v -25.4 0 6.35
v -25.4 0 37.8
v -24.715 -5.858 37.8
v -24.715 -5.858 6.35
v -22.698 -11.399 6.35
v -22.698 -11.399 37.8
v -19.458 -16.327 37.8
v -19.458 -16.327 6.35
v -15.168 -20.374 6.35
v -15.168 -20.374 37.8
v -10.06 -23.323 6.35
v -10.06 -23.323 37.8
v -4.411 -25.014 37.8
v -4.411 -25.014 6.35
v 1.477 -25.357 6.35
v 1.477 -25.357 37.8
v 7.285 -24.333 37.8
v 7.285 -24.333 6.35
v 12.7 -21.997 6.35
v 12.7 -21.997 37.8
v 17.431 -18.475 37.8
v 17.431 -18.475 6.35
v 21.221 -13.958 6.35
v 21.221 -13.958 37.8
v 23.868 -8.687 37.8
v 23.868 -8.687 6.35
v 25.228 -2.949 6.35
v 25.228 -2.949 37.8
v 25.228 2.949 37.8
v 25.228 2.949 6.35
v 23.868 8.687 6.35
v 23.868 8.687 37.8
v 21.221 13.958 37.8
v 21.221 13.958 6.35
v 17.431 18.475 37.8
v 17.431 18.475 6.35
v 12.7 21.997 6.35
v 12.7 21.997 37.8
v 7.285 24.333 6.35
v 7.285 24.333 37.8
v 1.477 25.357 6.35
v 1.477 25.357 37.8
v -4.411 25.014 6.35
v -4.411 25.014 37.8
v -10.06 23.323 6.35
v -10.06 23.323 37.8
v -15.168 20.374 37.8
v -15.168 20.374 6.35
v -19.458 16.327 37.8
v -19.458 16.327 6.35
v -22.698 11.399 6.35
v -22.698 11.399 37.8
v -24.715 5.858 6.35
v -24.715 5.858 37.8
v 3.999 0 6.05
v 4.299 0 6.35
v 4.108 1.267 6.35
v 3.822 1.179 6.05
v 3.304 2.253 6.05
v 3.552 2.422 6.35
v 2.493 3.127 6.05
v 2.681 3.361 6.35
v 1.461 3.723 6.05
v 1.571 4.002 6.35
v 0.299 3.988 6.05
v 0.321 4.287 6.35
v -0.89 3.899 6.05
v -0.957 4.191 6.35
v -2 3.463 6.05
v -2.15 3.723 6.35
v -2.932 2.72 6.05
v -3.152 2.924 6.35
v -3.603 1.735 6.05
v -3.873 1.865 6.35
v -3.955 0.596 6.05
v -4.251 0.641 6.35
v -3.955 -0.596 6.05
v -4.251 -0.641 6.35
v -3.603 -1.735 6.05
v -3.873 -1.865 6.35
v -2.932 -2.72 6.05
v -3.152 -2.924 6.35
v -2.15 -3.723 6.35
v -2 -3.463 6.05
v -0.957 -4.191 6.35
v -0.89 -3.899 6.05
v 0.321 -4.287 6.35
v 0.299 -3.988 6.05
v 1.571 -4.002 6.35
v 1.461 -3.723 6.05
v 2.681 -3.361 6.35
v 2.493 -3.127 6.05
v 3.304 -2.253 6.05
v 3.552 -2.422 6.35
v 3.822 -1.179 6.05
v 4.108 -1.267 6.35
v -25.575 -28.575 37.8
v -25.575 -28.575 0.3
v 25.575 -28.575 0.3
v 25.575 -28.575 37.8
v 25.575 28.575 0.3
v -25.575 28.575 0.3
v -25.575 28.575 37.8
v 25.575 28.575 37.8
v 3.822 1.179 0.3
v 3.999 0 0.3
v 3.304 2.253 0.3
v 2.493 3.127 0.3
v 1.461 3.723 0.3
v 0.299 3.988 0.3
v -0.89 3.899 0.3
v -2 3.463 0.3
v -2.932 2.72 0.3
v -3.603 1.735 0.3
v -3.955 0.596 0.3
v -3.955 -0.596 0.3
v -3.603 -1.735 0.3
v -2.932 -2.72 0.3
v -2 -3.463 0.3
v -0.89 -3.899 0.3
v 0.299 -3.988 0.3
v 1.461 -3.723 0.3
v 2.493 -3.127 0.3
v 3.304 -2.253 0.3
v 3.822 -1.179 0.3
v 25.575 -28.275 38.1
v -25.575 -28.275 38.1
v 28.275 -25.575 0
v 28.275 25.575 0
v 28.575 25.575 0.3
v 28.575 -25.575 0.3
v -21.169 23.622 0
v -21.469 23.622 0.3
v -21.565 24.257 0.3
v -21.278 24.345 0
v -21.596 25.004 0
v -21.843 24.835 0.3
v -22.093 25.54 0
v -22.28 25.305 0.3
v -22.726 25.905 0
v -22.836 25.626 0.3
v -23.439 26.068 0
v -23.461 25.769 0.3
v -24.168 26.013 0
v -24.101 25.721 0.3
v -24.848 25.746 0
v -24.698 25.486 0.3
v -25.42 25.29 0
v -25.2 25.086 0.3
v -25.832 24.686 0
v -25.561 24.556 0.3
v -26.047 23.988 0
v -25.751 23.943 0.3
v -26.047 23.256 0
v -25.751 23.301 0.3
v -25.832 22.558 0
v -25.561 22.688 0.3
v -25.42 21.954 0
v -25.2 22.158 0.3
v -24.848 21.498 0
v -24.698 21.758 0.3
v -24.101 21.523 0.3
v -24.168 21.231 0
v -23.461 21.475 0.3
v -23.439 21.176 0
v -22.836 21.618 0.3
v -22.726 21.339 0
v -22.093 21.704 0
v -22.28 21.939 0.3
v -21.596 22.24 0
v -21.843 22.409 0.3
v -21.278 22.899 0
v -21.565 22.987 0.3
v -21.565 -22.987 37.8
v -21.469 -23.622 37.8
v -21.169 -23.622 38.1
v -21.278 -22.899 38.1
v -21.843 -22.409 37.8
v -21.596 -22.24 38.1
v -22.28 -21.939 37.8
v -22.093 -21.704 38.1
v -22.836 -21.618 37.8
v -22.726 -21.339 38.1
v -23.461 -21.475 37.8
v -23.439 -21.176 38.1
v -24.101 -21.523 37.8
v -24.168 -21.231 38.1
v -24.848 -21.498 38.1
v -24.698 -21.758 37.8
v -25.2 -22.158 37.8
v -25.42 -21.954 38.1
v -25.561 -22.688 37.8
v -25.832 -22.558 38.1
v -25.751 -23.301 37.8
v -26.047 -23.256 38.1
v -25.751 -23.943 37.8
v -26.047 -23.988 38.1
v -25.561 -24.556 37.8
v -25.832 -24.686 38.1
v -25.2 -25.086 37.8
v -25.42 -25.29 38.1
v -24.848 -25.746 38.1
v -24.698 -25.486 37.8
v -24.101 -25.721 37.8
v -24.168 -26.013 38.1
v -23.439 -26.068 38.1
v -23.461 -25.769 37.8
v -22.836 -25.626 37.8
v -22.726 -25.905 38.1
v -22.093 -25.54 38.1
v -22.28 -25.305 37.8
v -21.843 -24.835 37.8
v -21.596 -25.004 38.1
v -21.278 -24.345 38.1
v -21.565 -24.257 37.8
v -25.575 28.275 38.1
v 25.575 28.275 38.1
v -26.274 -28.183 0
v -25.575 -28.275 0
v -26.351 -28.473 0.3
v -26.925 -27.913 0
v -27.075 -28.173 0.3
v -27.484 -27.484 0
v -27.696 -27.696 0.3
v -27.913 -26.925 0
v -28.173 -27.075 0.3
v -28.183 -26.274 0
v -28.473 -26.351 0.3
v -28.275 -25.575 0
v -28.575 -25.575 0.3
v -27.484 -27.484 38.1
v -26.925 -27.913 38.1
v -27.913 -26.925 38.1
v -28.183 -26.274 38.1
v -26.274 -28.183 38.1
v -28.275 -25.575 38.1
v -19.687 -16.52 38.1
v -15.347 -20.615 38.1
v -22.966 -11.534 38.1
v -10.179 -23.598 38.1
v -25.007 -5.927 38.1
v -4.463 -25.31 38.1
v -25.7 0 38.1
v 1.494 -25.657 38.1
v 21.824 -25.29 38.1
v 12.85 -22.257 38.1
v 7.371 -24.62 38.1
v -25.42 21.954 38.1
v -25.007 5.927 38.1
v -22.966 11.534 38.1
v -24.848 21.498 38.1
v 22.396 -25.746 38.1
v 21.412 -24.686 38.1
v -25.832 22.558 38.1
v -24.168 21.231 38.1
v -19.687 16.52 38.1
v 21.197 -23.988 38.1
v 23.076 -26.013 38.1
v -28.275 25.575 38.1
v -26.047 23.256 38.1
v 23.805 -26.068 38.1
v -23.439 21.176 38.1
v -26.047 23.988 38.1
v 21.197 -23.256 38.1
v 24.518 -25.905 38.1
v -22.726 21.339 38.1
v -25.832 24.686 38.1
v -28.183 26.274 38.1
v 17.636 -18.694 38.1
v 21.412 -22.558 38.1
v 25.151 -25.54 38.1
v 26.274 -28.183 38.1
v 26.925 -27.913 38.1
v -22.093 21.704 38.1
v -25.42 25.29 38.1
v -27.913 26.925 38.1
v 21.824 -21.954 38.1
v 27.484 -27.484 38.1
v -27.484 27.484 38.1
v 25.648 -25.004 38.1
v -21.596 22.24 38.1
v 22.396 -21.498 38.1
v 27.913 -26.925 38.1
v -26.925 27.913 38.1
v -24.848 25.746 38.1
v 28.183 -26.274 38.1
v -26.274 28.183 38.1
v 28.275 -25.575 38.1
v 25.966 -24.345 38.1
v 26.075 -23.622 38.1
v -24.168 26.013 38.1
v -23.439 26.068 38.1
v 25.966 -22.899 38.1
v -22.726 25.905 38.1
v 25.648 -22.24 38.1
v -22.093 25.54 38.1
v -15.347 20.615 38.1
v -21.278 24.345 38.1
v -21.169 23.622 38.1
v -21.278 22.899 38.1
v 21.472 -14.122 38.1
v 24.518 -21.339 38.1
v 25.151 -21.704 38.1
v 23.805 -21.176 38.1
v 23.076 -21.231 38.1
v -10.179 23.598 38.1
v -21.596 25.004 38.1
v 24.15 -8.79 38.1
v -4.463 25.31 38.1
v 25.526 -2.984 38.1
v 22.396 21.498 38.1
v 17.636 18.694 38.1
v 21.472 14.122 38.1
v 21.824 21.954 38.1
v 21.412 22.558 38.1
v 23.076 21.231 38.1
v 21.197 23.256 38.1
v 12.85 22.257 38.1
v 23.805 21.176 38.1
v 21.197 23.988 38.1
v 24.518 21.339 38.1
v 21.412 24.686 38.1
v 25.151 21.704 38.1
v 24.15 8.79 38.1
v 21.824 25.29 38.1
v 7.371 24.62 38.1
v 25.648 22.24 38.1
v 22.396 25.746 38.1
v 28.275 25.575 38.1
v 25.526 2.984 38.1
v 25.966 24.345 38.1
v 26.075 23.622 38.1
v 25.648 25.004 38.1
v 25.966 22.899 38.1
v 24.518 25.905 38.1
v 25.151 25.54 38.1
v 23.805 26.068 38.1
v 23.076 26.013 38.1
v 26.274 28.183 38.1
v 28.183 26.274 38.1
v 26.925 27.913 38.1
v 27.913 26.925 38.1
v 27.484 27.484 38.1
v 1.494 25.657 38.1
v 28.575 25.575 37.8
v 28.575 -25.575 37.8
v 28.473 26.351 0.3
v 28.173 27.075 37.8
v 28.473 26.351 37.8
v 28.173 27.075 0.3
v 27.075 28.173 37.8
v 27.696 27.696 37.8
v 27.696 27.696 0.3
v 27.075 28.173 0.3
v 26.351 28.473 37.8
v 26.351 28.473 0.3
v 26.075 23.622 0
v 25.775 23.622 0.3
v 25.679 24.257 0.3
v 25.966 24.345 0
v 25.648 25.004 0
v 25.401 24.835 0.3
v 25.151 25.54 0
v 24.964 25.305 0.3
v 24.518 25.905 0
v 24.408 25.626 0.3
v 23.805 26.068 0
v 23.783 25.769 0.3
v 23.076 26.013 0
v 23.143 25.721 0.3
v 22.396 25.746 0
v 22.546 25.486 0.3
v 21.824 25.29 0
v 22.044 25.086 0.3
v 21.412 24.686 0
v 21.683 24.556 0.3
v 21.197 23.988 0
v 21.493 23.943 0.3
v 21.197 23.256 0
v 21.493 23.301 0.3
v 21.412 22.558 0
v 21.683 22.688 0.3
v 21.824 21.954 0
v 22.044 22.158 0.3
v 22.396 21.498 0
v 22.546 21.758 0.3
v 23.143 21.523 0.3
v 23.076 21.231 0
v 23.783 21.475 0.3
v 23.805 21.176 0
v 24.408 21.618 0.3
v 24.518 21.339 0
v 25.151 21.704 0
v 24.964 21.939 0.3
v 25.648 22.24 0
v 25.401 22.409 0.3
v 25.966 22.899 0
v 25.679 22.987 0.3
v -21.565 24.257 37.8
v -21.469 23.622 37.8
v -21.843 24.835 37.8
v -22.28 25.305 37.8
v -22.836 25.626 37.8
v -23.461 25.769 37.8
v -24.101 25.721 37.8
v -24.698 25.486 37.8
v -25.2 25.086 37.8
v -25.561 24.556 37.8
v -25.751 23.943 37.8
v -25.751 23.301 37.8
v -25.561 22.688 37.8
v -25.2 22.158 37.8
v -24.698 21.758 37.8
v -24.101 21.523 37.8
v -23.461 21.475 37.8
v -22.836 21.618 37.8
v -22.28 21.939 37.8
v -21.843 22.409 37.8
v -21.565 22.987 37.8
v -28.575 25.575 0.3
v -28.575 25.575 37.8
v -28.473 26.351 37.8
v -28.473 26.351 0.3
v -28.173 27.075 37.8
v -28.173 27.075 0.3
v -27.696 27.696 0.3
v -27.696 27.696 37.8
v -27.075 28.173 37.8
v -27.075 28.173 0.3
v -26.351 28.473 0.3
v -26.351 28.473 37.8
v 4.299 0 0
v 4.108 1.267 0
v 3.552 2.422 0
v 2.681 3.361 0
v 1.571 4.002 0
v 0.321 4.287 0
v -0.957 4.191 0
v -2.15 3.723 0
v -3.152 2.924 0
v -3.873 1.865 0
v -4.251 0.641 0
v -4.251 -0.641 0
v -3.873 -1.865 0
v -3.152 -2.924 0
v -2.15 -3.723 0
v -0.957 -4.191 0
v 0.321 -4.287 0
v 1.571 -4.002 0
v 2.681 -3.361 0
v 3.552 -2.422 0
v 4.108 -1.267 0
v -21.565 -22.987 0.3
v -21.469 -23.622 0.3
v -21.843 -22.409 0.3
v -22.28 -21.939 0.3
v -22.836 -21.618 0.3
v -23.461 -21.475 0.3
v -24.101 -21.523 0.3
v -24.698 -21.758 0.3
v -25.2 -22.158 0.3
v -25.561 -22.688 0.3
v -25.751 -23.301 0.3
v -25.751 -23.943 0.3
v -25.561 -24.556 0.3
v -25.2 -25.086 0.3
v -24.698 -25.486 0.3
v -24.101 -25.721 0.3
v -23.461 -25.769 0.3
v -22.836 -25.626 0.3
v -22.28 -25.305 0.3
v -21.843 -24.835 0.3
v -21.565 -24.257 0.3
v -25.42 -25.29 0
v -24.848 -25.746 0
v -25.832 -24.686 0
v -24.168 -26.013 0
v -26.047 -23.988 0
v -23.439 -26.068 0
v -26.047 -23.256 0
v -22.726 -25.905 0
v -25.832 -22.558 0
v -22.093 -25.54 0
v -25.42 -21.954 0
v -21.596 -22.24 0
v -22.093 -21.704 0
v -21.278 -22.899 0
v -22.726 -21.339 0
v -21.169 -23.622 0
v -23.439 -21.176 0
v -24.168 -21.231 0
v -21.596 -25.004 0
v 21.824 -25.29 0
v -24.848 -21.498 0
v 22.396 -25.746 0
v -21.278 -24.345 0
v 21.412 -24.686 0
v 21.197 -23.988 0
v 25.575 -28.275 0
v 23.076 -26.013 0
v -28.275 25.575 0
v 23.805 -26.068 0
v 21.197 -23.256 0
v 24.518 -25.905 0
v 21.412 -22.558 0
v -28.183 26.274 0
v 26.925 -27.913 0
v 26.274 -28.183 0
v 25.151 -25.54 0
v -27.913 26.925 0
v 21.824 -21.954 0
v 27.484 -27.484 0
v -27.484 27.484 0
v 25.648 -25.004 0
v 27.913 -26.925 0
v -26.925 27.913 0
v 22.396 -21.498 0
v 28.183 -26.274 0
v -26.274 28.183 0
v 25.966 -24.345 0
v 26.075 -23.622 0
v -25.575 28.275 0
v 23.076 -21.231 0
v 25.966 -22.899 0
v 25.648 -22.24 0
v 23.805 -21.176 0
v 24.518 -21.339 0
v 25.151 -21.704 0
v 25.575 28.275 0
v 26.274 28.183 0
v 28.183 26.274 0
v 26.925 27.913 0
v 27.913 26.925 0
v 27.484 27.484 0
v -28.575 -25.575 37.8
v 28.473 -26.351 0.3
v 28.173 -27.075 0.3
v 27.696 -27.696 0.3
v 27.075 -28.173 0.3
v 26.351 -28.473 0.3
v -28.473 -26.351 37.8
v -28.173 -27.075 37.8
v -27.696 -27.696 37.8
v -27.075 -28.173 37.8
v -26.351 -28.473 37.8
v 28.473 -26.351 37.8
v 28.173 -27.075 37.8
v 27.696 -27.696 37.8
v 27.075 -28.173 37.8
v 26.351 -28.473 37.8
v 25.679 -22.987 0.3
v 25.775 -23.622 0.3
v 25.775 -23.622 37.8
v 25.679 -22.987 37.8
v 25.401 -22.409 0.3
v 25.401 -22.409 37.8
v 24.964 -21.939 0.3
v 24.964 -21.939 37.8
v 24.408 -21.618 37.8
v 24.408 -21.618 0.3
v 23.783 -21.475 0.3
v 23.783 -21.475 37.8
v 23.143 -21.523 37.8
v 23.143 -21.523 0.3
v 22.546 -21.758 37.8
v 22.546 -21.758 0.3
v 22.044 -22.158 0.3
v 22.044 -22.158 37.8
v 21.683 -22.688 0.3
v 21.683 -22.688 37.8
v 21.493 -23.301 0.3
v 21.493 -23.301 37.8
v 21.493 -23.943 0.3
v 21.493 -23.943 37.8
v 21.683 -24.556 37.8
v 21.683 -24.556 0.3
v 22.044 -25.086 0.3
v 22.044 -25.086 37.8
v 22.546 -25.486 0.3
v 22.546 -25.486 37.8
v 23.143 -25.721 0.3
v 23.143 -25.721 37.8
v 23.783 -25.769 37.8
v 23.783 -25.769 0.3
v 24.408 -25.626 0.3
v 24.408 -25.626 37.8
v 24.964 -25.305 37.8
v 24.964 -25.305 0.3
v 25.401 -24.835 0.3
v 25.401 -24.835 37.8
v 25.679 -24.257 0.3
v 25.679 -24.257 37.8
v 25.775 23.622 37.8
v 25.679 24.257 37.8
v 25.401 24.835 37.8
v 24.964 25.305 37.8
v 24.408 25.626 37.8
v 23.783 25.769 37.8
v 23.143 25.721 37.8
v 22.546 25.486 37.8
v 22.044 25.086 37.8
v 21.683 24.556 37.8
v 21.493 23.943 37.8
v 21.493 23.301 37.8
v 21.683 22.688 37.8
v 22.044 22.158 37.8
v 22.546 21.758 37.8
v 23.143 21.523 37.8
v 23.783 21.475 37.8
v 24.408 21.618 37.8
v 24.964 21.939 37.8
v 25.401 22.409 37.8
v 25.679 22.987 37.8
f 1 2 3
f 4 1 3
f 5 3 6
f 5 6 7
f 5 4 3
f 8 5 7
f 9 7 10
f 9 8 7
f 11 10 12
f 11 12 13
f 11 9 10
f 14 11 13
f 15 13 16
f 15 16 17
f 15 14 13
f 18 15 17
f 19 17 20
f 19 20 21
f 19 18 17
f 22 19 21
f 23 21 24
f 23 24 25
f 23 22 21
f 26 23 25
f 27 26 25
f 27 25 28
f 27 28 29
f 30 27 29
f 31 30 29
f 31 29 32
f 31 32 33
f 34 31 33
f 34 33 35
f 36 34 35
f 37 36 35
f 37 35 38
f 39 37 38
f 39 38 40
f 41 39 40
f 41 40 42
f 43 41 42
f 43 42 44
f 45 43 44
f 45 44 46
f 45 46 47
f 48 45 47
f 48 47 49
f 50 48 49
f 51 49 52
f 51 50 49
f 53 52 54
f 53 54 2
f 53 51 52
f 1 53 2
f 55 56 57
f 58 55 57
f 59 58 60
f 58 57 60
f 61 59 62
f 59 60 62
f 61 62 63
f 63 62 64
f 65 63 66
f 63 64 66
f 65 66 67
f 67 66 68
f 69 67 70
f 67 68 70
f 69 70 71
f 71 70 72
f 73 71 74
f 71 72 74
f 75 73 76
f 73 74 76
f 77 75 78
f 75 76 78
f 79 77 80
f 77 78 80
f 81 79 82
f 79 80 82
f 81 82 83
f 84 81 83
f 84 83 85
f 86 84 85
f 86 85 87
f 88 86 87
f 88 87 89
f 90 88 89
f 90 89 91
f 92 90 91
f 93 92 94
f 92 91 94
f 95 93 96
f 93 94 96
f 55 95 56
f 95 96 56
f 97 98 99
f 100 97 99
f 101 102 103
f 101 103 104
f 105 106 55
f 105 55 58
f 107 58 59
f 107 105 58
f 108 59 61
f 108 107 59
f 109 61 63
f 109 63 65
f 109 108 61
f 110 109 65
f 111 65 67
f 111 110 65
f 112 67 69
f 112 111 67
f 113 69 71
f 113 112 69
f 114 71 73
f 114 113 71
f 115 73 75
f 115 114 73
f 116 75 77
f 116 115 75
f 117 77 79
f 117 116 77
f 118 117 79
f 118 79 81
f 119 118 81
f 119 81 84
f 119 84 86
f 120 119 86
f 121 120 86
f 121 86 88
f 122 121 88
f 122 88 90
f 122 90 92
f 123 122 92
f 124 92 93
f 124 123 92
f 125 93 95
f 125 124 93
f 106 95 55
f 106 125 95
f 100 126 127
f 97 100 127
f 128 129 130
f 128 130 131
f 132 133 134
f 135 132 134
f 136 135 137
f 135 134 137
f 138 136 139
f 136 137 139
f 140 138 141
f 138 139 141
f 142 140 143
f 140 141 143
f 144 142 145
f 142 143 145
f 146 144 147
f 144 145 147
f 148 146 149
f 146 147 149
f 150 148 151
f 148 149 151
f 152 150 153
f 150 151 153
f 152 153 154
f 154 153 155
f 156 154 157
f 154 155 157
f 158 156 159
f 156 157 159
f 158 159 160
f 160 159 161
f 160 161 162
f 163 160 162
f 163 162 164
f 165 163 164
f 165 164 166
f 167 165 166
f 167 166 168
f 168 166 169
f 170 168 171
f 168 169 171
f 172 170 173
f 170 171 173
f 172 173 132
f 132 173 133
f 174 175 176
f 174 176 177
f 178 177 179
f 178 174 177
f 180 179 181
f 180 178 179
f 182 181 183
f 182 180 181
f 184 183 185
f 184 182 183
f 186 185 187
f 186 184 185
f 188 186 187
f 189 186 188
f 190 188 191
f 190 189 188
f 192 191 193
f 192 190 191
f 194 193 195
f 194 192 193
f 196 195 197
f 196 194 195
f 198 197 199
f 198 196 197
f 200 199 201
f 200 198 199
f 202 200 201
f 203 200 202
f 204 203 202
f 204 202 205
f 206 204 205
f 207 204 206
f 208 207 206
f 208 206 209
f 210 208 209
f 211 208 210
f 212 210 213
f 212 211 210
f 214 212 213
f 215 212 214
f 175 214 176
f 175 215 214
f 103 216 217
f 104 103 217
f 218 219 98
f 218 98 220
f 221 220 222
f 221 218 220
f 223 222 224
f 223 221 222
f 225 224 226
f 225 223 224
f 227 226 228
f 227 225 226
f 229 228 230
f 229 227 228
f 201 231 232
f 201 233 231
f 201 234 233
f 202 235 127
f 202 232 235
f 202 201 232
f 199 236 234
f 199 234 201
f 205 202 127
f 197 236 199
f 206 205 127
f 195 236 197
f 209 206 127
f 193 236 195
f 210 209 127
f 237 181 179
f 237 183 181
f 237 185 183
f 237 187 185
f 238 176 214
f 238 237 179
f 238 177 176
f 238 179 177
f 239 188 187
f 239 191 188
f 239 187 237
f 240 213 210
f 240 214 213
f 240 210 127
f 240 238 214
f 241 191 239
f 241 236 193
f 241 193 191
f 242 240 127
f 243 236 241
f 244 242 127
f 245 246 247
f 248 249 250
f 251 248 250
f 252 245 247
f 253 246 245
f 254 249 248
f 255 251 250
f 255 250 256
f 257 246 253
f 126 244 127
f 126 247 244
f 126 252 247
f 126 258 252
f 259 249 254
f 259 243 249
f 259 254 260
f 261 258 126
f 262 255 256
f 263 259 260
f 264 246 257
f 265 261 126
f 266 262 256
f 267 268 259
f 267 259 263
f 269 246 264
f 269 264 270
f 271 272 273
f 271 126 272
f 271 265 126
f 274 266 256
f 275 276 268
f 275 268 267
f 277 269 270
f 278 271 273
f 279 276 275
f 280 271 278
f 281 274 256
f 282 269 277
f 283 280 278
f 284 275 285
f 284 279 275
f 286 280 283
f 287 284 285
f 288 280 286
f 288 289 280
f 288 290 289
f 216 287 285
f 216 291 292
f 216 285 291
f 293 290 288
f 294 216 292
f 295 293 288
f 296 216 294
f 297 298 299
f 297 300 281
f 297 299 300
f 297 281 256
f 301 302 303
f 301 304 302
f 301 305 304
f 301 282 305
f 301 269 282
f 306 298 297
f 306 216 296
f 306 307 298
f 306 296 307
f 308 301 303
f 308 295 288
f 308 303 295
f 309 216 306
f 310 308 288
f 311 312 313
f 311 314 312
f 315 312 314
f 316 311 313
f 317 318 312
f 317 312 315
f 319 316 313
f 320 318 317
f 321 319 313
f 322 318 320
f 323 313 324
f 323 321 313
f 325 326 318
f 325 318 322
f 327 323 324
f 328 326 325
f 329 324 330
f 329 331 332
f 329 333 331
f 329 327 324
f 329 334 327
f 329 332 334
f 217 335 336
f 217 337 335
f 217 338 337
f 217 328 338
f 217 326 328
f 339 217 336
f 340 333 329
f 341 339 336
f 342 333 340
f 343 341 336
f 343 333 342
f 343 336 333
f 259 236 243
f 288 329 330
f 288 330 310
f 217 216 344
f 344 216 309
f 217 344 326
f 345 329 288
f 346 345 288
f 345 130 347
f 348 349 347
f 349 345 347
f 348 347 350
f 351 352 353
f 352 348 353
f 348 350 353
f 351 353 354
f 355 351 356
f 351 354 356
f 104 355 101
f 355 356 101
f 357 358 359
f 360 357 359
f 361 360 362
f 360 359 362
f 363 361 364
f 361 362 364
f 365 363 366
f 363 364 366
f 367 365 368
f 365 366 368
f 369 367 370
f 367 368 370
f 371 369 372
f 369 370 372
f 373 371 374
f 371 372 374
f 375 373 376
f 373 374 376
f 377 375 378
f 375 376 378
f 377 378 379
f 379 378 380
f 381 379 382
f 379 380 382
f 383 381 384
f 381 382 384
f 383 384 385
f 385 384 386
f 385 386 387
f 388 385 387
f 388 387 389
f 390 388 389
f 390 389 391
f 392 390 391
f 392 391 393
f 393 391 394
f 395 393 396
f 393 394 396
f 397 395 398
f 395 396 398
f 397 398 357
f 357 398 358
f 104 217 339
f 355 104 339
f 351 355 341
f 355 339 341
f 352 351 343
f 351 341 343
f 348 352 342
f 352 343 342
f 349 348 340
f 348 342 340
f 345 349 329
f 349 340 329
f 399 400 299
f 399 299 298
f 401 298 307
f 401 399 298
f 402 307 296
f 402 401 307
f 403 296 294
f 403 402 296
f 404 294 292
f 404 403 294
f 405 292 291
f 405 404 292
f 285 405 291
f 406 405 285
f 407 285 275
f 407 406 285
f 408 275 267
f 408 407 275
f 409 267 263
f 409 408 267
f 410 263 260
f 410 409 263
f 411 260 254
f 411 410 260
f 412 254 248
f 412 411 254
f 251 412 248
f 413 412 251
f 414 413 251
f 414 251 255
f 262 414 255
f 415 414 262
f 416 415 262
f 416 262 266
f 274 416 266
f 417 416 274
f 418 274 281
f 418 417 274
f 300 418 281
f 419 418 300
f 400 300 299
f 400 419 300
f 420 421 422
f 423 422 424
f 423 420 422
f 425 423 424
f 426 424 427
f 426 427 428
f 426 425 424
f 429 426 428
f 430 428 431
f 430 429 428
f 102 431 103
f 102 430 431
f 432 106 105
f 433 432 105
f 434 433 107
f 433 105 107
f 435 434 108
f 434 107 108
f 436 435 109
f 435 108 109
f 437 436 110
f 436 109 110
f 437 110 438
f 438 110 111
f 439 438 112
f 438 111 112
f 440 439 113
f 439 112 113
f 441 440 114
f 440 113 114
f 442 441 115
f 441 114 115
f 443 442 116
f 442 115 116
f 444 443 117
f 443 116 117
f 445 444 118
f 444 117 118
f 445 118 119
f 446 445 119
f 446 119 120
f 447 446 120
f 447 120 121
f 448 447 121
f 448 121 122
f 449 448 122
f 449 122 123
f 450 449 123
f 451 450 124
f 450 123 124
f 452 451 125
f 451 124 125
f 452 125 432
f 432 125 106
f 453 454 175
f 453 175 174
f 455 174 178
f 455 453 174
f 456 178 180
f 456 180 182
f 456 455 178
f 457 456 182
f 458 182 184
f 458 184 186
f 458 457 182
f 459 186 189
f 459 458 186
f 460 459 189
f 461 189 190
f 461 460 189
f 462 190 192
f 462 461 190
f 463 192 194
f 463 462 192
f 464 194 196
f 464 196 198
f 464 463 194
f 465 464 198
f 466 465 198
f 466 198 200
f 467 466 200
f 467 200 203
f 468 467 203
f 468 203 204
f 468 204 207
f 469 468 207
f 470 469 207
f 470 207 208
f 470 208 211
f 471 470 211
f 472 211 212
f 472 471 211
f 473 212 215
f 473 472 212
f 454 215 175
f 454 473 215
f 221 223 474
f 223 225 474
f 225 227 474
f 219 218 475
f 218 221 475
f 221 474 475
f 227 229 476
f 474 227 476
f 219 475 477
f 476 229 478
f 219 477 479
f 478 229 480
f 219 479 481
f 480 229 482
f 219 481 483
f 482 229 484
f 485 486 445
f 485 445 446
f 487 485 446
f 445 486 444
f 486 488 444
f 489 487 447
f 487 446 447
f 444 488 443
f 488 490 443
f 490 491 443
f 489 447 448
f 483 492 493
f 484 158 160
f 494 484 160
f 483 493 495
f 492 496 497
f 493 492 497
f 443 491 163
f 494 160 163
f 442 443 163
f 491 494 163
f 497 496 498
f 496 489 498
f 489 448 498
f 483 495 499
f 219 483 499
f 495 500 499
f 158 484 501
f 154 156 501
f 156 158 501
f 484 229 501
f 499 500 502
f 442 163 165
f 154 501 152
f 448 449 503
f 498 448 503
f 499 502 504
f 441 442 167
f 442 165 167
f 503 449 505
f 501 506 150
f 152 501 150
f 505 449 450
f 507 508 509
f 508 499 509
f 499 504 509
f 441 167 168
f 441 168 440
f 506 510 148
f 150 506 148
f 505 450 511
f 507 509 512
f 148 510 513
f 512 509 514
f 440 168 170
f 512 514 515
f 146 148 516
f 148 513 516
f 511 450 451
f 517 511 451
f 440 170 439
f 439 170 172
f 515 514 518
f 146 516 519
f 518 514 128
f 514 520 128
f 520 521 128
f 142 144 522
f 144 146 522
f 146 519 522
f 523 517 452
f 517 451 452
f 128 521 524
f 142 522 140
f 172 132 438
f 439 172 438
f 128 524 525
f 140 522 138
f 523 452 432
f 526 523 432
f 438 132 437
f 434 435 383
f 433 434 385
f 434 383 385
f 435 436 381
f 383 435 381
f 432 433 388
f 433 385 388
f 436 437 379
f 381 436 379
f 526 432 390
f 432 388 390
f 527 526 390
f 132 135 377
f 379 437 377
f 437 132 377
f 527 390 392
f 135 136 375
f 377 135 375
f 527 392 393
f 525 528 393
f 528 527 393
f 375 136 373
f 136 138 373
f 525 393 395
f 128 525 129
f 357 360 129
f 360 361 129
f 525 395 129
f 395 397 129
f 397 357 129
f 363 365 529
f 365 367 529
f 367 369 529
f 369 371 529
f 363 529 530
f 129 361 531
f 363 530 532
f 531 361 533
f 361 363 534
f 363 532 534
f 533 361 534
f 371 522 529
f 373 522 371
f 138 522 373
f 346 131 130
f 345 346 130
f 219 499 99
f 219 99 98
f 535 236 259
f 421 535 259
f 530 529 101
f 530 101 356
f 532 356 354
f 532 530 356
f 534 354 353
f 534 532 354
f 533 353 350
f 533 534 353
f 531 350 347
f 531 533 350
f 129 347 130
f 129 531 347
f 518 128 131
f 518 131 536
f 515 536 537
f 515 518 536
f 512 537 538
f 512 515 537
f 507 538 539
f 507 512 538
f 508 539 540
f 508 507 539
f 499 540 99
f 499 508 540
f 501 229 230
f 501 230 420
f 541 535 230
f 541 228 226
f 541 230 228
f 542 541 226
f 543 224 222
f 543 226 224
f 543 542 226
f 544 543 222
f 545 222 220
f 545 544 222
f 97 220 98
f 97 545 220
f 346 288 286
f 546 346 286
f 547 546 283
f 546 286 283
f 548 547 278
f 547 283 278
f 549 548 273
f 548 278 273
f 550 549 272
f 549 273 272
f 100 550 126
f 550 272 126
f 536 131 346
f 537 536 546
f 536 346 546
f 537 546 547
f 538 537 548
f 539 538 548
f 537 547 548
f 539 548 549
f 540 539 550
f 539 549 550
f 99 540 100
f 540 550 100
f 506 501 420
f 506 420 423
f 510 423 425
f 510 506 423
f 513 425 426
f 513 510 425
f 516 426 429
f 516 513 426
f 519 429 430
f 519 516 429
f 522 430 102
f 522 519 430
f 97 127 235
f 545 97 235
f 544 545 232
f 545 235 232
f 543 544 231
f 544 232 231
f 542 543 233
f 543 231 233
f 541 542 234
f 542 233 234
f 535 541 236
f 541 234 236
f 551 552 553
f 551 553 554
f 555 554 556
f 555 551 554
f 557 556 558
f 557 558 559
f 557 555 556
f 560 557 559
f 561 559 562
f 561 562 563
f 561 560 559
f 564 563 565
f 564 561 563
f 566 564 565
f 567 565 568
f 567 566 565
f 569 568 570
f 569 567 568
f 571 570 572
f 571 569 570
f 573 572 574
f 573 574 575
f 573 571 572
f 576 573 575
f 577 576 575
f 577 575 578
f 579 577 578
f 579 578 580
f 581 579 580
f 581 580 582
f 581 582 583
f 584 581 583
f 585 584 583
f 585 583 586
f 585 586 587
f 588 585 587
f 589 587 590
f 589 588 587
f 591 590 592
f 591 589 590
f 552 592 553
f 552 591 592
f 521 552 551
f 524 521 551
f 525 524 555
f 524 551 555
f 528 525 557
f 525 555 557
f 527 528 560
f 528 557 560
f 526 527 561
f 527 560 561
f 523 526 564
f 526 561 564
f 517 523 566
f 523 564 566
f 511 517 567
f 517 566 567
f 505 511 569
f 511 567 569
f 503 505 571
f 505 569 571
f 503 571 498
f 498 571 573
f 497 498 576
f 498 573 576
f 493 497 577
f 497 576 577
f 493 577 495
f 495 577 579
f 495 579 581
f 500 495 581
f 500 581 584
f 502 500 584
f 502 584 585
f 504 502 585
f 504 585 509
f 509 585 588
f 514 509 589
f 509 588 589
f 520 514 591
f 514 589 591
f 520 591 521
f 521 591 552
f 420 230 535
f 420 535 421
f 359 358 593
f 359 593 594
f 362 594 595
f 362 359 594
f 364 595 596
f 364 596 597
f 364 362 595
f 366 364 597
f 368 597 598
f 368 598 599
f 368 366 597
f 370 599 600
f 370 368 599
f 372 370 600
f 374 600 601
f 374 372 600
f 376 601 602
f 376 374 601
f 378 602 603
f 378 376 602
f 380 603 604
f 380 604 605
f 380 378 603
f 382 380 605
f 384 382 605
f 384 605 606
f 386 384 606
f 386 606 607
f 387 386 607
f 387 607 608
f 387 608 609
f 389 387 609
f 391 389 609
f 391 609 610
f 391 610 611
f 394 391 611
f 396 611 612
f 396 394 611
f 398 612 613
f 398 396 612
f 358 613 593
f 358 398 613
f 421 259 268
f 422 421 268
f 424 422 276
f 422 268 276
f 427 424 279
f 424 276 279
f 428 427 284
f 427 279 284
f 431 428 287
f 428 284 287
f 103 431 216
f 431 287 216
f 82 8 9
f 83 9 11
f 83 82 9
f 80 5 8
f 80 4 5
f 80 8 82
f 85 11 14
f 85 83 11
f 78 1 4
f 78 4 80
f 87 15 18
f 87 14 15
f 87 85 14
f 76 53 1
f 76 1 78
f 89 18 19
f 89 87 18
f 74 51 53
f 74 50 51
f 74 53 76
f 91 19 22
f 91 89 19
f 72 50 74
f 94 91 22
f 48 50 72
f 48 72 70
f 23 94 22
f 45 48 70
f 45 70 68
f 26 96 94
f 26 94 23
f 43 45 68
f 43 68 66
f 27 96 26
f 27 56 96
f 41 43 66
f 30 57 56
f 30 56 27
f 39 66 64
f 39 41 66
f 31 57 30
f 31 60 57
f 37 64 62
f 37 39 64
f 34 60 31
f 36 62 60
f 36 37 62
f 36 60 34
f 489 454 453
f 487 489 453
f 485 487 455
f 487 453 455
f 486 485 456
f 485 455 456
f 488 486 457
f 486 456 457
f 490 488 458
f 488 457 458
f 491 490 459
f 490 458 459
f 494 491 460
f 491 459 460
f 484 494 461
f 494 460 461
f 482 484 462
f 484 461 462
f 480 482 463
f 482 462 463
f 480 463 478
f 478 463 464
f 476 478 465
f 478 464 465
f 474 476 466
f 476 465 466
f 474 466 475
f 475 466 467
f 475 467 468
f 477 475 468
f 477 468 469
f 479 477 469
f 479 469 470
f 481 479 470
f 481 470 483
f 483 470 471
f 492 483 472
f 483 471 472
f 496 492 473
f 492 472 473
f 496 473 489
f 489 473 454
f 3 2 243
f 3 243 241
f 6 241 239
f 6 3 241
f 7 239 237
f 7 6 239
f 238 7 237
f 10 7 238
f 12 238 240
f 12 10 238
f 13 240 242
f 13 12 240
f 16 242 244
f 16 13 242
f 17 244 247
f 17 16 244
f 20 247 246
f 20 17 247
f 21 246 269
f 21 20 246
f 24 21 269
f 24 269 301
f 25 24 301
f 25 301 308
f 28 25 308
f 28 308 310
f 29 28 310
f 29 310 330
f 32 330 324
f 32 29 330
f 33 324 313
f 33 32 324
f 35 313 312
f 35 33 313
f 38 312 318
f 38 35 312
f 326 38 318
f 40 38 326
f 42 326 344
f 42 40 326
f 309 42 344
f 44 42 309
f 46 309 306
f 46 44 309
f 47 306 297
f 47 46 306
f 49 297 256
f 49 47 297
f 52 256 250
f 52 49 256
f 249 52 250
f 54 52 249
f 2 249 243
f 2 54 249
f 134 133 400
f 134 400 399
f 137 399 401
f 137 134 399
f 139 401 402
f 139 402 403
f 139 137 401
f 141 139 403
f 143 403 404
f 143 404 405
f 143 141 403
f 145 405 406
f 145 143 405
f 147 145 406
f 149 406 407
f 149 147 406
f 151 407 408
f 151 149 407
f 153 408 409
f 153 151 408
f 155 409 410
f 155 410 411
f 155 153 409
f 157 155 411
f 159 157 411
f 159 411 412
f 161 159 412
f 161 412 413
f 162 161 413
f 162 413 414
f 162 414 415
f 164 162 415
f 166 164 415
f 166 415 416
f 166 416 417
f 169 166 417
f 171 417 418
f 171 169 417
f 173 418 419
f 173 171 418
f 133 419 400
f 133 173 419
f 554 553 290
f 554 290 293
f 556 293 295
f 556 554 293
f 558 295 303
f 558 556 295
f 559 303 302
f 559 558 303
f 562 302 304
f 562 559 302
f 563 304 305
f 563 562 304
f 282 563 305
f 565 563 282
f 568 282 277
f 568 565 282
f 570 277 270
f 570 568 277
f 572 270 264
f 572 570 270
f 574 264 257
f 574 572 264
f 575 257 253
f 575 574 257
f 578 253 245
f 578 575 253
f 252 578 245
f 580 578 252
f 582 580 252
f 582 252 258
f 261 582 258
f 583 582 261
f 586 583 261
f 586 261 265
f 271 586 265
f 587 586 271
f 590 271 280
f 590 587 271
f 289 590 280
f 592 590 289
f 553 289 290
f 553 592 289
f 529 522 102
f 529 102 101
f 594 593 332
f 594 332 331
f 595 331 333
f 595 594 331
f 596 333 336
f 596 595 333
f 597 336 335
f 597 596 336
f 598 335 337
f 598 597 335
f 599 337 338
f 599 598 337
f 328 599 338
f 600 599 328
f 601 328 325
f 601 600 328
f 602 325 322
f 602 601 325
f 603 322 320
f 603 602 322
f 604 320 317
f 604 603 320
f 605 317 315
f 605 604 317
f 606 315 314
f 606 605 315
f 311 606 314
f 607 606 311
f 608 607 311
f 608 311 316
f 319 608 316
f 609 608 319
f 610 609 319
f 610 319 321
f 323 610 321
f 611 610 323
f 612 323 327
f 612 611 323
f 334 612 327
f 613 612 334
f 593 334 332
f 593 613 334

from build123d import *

# Parameters (mm, degrees)
SKETCH1_W           = 57.15
SKETCH1_H           = 57.15
SKETCH1_R           = 2.15265
SKETCH1_R_2         = 3.99923
BOSS_EXTRUDE1_DEPTH = 6.35
SKETCH1_3_W         = 57.15
SKETCH1_3_H         = 57.15
SKETCH1_3_R         = 2.15265
SKETCH1_3_R_2       = 25.4
BOSS_EXTRUDE2_DEPTH = 38.1
FILLET1_R           = 3
CHAMFER1_SIZE       = 0.3


with BuildPart() as part:
    # Sketch1 → Boss-Extrude1 (new body)
    with BuildSketch(Plane.XY):
        Rectangle(SKETCH1_W, SKETCH1_H)
        with Locations((-23.622, -23.622)):
            Circle(SKETCH1_R, mode=Mode.SUBTRACT)
        with Locations((23.622, -23.622)):
            Circle(SKETCH1_R, mode=Mode.SUBTRACT)
        with Locations((-23.622, 23.622)):
            Circle(SKETCH1_R, mode=Mode.SUBTRACT)
        with Locations((23.622, 23.622)):
            Circle(SKETCH1_R, mode=Mode.SUBTRACT)
        Circle(SKETCH1_R_2, mode=Mode.SUBTRACT)
    extrude(amount=BOSS_EXTRUDE1_DEPTH)

    # Sketch1<3> → Boss-Extrude2 (add)
    with BuildSketch(Plane.XY):
        Rectangle(SKETCH1_3_W, SKETCH1_3_H)
        with Locations((-23.622, -23.622)):
            Circle(SKETCH1_3_R, mode=Mode.SUBTRACT)
        Circle(SKETCH1_3_R_2, mode=Mode.SUBTRACT)
        with Locations((23.622, -23.622)):
            Circle(SKETCH1_3_R, mode=Mode.SUBTRACT)
        with Locations((-23.622, 23.622)):
            Circle(SKETCH1_3_R, mode=Mode.SUBTRACT)
        with Locations((23.622, 23.622)):
            Circle(SKETCH1_3_R, mode=Mode.SUBTRACT)
    extrude(amount=BOSS_EXTRUDE2_DEPTH)

    # Fillet1
    fillet1_edges = [part.edges().sort_by_distance(p)[0] for p in [
        (-28.575, 28.575, 19.05),
        (28.575, 28.575, 19.05),
        (28.575, -28.575, 19.05),
        (-28.575, -28.575, 19.05),
    ]]
    fillet(fillet1_edges, radius=FILLET1_R)

    # Chamfer1
    chamfer1_edges = [part.edges().sort_by_distance(p)[0] for p in [
        (-25.77465, -23.622, 0),
        (21.46935, -23.622, 0),
        (21.46935, 23.622, 0),
        (-25.77465, 23.622, 0),
        (-27.696320344, -27.696320344, 0),
        (0, -28.575, 0),
        (27.696320344, -27.696320344, 0),
        (28.575, 0, 0),
        (27.696320344, 27.696320344, 0),
        (0, 28.575, 0),
        (-27.696320344, 27.696320344, 0),
        (-28.575, 0, 0),
        (-3.99923, 0, 0),
        (27.696320344, 27.696320344, 38.1),
        (28.575, 0, 38.1),
        (27.696320344, -27.696320344, 38.1),
        (0, -28.575, 38.1),
        (-27.696320344, -27.696320344, 38.1),
        (-28.575, 0, 38.1),
        (-27.696320344, 27.696320344, 38.1),
        (0, 28.575, 38.1),
        (-25.77465, 23.622, 38.1),
        (21.46935, 23.622, 38.1),
        (21.46935, -23.622, 38.1),
        (-25.77465, -23.622, 38.1),
        (-25.4, 0, 38.1),
        (-3.99923, 0, 6.35),
    ]]
    chamfer(chamfer1_edges, length=CHAMFER1_SIZE)


solid = part.part
